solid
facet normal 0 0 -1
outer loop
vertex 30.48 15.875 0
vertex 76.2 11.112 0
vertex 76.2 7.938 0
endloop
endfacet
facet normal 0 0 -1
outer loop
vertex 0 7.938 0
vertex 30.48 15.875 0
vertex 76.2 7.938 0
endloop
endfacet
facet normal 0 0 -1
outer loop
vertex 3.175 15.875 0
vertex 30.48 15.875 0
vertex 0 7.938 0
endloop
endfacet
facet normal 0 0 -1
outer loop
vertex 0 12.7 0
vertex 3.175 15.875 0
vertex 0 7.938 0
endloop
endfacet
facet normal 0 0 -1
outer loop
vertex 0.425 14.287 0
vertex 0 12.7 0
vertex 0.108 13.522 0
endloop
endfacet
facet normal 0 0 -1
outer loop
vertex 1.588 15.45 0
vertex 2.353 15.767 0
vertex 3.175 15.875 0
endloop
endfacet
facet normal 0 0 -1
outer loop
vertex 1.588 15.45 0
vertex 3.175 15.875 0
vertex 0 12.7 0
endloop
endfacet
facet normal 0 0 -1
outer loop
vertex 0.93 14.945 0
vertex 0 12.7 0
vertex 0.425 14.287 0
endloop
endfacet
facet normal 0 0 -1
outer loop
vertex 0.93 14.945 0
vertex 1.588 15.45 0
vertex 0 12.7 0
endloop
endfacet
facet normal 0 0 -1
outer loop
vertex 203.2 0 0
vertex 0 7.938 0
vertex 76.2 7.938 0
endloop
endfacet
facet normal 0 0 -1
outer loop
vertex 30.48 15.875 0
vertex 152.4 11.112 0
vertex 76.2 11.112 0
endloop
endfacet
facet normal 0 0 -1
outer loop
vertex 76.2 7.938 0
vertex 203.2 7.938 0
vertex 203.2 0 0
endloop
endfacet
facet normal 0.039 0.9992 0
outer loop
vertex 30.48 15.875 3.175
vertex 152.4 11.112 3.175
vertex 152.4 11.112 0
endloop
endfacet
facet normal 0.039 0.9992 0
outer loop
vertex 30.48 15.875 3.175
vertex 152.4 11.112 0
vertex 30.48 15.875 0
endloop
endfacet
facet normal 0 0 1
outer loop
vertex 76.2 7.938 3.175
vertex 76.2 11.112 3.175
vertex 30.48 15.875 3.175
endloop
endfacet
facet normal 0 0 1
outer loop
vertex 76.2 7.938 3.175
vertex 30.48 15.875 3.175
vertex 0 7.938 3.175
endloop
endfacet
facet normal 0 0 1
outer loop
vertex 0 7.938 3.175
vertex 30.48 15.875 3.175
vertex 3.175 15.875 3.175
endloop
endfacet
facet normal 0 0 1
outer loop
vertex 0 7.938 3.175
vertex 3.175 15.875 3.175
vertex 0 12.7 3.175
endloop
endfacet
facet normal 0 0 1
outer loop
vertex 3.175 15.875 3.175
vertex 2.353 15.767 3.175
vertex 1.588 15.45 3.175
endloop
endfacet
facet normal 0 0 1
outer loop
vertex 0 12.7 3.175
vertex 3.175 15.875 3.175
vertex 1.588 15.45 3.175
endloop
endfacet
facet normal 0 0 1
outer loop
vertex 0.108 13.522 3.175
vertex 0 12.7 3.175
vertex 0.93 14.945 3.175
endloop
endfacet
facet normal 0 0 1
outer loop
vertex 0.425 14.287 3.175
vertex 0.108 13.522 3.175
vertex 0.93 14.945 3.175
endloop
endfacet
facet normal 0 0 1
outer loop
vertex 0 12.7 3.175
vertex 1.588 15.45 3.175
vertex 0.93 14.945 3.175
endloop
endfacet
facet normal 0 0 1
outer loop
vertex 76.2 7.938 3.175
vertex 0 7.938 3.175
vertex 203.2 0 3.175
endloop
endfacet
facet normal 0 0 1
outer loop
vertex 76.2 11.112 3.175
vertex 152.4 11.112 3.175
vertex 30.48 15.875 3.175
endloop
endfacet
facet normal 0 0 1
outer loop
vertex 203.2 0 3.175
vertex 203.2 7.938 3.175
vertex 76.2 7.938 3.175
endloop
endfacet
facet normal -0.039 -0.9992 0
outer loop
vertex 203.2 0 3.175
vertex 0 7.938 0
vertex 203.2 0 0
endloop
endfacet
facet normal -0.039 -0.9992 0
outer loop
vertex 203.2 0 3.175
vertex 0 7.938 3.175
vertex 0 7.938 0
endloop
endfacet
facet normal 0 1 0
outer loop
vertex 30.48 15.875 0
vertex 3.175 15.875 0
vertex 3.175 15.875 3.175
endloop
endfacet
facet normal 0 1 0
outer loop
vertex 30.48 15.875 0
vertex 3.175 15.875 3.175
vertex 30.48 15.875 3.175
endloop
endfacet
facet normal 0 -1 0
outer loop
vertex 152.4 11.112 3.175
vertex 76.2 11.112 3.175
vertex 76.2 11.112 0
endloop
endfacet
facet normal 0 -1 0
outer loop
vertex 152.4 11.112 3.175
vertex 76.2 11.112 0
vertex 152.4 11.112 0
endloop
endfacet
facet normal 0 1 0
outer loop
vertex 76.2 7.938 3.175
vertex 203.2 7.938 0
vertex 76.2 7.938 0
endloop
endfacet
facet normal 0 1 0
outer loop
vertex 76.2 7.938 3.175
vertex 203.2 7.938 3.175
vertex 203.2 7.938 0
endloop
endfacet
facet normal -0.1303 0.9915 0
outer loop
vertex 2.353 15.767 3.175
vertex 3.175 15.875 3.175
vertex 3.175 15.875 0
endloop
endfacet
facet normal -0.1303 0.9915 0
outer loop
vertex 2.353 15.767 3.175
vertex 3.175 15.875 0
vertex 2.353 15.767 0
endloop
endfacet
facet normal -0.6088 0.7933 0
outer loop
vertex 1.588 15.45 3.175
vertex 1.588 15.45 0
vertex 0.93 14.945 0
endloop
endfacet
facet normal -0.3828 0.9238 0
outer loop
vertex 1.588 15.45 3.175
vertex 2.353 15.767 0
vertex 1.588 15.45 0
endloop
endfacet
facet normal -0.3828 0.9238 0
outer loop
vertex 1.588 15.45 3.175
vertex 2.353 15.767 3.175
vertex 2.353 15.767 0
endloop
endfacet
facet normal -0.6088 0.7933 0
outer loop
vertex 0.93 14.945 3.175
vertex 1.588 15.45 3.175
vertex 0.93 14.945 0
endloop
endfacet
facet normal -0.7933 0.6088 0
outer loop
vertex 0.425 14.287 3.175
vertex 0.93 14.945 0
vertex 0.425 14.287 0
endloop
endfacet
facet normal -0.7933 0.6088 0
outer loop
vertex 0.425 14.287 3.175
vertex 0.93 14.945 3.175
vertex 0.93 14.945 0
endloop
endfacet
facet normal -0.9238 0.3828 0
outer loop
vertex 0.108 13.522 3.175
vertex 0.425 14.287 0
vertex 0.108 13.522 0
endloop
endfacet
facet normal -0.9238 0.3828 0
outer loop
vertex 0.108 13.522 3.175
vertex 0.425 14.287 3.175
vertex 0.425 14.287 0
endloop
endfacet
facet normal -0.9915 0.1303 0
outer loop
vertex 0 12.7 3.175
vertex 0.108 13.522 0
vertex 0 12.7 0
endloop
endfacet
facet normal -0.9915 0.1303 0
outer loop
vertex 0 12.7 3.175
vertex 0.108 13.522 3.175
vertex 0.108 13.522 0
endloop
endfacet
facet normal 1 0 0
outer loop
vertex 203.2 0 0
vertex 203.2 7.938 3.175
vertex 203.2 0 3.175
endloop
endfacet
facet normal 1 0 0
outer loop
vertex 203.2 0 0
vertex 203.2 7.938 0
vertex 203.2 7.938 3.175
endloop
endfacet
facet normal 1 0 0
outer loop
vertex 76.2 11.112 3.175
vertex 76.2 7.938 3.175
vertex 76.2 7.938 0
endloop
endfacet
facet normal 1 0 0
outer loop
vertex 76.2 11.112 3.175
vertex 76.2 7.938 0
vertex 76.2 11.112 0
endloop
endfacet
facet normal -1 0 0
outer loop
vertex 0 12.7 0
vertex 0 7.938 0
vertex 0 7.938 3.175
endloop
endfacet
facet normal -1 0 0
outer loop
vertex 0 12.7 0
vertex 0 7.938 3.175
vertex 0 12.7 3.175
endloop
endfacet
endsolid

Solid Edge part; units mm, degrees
sketch "Sketch1" plane through (0, 0, 0) normal (0, 0, 1) x (1, 0, 0)
  line L0 (0, 0) -> (0, 15.875)
  line L1 (0, 15.875) -> (203.2, 15.875)
  line L2 (203.2, 15.875) -> (203.2, 0)
  line L3 (203.2, 0) -> (0, 0)
  dimension "D1" = 203.2
  dimension "D2" = 15.875
extrude "Protrusion1" add sketch "Sketch1" along normal blind 3.175
sketch "Sketch2" plane through (101.6, 9.525, 3.175) normal (0, 0, 1) x (1, 0, 0)
  line L0 (-25.4, 1.5875) -> (101.6, 1.5875)
  line L1 (101.6, 1.5875) -> (101.6, -1.5875)
  line L2 (101.6, -1.5875) -> (-25.4, -1.5875)
  line L3 (-25.4, -1.5875) -> (-25.4, 1.5875)
  dimension "D1" = 76.2
  dimension "D2" = 3.175
  dimension "D3" = 4.7625
extrude "Cutout1" cut sketch "Sketch2" against normal through all
sketch "Sketch3" plane through (101.6, 9.525, 3.175) normal (0, 0, 1) x (1, 0, 0)
  line L0 (-101.6, -1.5875) -> (101.6, -9.525)
  line L1 (101.6, -9.525) -> (-101.6, -9.525)
  line L2 (-101.6, -9.525) -> (-101.6, -1.5875)
extrude "Cutout2" cut sketch "Sketch3" against normal through all
sketch "Sketch4" plane through (101.6, 9.525, 3.175) normal (0, 0, 1) x (1, 0, 0)
  line L0 (101.6, 1.5875) -> (50.8, 1.5875)
  line L1 (50.8, 1.5875) -> (-71.12, 6.35)
  line L2 (-71.12, 6.35) -> (101.6, 6.35)
  line L3 (101.6, 6.35) -> (101.6, 1.5875)
  dimension "D1" = 76.2
extrude "Cutout3" cut sketch "Sketch4" against normal through all
fillet "Round_1" radius 3.175 1 edges at (0, 15.875, 1.5875)
properties material "ABS Plastic, medium impact"
